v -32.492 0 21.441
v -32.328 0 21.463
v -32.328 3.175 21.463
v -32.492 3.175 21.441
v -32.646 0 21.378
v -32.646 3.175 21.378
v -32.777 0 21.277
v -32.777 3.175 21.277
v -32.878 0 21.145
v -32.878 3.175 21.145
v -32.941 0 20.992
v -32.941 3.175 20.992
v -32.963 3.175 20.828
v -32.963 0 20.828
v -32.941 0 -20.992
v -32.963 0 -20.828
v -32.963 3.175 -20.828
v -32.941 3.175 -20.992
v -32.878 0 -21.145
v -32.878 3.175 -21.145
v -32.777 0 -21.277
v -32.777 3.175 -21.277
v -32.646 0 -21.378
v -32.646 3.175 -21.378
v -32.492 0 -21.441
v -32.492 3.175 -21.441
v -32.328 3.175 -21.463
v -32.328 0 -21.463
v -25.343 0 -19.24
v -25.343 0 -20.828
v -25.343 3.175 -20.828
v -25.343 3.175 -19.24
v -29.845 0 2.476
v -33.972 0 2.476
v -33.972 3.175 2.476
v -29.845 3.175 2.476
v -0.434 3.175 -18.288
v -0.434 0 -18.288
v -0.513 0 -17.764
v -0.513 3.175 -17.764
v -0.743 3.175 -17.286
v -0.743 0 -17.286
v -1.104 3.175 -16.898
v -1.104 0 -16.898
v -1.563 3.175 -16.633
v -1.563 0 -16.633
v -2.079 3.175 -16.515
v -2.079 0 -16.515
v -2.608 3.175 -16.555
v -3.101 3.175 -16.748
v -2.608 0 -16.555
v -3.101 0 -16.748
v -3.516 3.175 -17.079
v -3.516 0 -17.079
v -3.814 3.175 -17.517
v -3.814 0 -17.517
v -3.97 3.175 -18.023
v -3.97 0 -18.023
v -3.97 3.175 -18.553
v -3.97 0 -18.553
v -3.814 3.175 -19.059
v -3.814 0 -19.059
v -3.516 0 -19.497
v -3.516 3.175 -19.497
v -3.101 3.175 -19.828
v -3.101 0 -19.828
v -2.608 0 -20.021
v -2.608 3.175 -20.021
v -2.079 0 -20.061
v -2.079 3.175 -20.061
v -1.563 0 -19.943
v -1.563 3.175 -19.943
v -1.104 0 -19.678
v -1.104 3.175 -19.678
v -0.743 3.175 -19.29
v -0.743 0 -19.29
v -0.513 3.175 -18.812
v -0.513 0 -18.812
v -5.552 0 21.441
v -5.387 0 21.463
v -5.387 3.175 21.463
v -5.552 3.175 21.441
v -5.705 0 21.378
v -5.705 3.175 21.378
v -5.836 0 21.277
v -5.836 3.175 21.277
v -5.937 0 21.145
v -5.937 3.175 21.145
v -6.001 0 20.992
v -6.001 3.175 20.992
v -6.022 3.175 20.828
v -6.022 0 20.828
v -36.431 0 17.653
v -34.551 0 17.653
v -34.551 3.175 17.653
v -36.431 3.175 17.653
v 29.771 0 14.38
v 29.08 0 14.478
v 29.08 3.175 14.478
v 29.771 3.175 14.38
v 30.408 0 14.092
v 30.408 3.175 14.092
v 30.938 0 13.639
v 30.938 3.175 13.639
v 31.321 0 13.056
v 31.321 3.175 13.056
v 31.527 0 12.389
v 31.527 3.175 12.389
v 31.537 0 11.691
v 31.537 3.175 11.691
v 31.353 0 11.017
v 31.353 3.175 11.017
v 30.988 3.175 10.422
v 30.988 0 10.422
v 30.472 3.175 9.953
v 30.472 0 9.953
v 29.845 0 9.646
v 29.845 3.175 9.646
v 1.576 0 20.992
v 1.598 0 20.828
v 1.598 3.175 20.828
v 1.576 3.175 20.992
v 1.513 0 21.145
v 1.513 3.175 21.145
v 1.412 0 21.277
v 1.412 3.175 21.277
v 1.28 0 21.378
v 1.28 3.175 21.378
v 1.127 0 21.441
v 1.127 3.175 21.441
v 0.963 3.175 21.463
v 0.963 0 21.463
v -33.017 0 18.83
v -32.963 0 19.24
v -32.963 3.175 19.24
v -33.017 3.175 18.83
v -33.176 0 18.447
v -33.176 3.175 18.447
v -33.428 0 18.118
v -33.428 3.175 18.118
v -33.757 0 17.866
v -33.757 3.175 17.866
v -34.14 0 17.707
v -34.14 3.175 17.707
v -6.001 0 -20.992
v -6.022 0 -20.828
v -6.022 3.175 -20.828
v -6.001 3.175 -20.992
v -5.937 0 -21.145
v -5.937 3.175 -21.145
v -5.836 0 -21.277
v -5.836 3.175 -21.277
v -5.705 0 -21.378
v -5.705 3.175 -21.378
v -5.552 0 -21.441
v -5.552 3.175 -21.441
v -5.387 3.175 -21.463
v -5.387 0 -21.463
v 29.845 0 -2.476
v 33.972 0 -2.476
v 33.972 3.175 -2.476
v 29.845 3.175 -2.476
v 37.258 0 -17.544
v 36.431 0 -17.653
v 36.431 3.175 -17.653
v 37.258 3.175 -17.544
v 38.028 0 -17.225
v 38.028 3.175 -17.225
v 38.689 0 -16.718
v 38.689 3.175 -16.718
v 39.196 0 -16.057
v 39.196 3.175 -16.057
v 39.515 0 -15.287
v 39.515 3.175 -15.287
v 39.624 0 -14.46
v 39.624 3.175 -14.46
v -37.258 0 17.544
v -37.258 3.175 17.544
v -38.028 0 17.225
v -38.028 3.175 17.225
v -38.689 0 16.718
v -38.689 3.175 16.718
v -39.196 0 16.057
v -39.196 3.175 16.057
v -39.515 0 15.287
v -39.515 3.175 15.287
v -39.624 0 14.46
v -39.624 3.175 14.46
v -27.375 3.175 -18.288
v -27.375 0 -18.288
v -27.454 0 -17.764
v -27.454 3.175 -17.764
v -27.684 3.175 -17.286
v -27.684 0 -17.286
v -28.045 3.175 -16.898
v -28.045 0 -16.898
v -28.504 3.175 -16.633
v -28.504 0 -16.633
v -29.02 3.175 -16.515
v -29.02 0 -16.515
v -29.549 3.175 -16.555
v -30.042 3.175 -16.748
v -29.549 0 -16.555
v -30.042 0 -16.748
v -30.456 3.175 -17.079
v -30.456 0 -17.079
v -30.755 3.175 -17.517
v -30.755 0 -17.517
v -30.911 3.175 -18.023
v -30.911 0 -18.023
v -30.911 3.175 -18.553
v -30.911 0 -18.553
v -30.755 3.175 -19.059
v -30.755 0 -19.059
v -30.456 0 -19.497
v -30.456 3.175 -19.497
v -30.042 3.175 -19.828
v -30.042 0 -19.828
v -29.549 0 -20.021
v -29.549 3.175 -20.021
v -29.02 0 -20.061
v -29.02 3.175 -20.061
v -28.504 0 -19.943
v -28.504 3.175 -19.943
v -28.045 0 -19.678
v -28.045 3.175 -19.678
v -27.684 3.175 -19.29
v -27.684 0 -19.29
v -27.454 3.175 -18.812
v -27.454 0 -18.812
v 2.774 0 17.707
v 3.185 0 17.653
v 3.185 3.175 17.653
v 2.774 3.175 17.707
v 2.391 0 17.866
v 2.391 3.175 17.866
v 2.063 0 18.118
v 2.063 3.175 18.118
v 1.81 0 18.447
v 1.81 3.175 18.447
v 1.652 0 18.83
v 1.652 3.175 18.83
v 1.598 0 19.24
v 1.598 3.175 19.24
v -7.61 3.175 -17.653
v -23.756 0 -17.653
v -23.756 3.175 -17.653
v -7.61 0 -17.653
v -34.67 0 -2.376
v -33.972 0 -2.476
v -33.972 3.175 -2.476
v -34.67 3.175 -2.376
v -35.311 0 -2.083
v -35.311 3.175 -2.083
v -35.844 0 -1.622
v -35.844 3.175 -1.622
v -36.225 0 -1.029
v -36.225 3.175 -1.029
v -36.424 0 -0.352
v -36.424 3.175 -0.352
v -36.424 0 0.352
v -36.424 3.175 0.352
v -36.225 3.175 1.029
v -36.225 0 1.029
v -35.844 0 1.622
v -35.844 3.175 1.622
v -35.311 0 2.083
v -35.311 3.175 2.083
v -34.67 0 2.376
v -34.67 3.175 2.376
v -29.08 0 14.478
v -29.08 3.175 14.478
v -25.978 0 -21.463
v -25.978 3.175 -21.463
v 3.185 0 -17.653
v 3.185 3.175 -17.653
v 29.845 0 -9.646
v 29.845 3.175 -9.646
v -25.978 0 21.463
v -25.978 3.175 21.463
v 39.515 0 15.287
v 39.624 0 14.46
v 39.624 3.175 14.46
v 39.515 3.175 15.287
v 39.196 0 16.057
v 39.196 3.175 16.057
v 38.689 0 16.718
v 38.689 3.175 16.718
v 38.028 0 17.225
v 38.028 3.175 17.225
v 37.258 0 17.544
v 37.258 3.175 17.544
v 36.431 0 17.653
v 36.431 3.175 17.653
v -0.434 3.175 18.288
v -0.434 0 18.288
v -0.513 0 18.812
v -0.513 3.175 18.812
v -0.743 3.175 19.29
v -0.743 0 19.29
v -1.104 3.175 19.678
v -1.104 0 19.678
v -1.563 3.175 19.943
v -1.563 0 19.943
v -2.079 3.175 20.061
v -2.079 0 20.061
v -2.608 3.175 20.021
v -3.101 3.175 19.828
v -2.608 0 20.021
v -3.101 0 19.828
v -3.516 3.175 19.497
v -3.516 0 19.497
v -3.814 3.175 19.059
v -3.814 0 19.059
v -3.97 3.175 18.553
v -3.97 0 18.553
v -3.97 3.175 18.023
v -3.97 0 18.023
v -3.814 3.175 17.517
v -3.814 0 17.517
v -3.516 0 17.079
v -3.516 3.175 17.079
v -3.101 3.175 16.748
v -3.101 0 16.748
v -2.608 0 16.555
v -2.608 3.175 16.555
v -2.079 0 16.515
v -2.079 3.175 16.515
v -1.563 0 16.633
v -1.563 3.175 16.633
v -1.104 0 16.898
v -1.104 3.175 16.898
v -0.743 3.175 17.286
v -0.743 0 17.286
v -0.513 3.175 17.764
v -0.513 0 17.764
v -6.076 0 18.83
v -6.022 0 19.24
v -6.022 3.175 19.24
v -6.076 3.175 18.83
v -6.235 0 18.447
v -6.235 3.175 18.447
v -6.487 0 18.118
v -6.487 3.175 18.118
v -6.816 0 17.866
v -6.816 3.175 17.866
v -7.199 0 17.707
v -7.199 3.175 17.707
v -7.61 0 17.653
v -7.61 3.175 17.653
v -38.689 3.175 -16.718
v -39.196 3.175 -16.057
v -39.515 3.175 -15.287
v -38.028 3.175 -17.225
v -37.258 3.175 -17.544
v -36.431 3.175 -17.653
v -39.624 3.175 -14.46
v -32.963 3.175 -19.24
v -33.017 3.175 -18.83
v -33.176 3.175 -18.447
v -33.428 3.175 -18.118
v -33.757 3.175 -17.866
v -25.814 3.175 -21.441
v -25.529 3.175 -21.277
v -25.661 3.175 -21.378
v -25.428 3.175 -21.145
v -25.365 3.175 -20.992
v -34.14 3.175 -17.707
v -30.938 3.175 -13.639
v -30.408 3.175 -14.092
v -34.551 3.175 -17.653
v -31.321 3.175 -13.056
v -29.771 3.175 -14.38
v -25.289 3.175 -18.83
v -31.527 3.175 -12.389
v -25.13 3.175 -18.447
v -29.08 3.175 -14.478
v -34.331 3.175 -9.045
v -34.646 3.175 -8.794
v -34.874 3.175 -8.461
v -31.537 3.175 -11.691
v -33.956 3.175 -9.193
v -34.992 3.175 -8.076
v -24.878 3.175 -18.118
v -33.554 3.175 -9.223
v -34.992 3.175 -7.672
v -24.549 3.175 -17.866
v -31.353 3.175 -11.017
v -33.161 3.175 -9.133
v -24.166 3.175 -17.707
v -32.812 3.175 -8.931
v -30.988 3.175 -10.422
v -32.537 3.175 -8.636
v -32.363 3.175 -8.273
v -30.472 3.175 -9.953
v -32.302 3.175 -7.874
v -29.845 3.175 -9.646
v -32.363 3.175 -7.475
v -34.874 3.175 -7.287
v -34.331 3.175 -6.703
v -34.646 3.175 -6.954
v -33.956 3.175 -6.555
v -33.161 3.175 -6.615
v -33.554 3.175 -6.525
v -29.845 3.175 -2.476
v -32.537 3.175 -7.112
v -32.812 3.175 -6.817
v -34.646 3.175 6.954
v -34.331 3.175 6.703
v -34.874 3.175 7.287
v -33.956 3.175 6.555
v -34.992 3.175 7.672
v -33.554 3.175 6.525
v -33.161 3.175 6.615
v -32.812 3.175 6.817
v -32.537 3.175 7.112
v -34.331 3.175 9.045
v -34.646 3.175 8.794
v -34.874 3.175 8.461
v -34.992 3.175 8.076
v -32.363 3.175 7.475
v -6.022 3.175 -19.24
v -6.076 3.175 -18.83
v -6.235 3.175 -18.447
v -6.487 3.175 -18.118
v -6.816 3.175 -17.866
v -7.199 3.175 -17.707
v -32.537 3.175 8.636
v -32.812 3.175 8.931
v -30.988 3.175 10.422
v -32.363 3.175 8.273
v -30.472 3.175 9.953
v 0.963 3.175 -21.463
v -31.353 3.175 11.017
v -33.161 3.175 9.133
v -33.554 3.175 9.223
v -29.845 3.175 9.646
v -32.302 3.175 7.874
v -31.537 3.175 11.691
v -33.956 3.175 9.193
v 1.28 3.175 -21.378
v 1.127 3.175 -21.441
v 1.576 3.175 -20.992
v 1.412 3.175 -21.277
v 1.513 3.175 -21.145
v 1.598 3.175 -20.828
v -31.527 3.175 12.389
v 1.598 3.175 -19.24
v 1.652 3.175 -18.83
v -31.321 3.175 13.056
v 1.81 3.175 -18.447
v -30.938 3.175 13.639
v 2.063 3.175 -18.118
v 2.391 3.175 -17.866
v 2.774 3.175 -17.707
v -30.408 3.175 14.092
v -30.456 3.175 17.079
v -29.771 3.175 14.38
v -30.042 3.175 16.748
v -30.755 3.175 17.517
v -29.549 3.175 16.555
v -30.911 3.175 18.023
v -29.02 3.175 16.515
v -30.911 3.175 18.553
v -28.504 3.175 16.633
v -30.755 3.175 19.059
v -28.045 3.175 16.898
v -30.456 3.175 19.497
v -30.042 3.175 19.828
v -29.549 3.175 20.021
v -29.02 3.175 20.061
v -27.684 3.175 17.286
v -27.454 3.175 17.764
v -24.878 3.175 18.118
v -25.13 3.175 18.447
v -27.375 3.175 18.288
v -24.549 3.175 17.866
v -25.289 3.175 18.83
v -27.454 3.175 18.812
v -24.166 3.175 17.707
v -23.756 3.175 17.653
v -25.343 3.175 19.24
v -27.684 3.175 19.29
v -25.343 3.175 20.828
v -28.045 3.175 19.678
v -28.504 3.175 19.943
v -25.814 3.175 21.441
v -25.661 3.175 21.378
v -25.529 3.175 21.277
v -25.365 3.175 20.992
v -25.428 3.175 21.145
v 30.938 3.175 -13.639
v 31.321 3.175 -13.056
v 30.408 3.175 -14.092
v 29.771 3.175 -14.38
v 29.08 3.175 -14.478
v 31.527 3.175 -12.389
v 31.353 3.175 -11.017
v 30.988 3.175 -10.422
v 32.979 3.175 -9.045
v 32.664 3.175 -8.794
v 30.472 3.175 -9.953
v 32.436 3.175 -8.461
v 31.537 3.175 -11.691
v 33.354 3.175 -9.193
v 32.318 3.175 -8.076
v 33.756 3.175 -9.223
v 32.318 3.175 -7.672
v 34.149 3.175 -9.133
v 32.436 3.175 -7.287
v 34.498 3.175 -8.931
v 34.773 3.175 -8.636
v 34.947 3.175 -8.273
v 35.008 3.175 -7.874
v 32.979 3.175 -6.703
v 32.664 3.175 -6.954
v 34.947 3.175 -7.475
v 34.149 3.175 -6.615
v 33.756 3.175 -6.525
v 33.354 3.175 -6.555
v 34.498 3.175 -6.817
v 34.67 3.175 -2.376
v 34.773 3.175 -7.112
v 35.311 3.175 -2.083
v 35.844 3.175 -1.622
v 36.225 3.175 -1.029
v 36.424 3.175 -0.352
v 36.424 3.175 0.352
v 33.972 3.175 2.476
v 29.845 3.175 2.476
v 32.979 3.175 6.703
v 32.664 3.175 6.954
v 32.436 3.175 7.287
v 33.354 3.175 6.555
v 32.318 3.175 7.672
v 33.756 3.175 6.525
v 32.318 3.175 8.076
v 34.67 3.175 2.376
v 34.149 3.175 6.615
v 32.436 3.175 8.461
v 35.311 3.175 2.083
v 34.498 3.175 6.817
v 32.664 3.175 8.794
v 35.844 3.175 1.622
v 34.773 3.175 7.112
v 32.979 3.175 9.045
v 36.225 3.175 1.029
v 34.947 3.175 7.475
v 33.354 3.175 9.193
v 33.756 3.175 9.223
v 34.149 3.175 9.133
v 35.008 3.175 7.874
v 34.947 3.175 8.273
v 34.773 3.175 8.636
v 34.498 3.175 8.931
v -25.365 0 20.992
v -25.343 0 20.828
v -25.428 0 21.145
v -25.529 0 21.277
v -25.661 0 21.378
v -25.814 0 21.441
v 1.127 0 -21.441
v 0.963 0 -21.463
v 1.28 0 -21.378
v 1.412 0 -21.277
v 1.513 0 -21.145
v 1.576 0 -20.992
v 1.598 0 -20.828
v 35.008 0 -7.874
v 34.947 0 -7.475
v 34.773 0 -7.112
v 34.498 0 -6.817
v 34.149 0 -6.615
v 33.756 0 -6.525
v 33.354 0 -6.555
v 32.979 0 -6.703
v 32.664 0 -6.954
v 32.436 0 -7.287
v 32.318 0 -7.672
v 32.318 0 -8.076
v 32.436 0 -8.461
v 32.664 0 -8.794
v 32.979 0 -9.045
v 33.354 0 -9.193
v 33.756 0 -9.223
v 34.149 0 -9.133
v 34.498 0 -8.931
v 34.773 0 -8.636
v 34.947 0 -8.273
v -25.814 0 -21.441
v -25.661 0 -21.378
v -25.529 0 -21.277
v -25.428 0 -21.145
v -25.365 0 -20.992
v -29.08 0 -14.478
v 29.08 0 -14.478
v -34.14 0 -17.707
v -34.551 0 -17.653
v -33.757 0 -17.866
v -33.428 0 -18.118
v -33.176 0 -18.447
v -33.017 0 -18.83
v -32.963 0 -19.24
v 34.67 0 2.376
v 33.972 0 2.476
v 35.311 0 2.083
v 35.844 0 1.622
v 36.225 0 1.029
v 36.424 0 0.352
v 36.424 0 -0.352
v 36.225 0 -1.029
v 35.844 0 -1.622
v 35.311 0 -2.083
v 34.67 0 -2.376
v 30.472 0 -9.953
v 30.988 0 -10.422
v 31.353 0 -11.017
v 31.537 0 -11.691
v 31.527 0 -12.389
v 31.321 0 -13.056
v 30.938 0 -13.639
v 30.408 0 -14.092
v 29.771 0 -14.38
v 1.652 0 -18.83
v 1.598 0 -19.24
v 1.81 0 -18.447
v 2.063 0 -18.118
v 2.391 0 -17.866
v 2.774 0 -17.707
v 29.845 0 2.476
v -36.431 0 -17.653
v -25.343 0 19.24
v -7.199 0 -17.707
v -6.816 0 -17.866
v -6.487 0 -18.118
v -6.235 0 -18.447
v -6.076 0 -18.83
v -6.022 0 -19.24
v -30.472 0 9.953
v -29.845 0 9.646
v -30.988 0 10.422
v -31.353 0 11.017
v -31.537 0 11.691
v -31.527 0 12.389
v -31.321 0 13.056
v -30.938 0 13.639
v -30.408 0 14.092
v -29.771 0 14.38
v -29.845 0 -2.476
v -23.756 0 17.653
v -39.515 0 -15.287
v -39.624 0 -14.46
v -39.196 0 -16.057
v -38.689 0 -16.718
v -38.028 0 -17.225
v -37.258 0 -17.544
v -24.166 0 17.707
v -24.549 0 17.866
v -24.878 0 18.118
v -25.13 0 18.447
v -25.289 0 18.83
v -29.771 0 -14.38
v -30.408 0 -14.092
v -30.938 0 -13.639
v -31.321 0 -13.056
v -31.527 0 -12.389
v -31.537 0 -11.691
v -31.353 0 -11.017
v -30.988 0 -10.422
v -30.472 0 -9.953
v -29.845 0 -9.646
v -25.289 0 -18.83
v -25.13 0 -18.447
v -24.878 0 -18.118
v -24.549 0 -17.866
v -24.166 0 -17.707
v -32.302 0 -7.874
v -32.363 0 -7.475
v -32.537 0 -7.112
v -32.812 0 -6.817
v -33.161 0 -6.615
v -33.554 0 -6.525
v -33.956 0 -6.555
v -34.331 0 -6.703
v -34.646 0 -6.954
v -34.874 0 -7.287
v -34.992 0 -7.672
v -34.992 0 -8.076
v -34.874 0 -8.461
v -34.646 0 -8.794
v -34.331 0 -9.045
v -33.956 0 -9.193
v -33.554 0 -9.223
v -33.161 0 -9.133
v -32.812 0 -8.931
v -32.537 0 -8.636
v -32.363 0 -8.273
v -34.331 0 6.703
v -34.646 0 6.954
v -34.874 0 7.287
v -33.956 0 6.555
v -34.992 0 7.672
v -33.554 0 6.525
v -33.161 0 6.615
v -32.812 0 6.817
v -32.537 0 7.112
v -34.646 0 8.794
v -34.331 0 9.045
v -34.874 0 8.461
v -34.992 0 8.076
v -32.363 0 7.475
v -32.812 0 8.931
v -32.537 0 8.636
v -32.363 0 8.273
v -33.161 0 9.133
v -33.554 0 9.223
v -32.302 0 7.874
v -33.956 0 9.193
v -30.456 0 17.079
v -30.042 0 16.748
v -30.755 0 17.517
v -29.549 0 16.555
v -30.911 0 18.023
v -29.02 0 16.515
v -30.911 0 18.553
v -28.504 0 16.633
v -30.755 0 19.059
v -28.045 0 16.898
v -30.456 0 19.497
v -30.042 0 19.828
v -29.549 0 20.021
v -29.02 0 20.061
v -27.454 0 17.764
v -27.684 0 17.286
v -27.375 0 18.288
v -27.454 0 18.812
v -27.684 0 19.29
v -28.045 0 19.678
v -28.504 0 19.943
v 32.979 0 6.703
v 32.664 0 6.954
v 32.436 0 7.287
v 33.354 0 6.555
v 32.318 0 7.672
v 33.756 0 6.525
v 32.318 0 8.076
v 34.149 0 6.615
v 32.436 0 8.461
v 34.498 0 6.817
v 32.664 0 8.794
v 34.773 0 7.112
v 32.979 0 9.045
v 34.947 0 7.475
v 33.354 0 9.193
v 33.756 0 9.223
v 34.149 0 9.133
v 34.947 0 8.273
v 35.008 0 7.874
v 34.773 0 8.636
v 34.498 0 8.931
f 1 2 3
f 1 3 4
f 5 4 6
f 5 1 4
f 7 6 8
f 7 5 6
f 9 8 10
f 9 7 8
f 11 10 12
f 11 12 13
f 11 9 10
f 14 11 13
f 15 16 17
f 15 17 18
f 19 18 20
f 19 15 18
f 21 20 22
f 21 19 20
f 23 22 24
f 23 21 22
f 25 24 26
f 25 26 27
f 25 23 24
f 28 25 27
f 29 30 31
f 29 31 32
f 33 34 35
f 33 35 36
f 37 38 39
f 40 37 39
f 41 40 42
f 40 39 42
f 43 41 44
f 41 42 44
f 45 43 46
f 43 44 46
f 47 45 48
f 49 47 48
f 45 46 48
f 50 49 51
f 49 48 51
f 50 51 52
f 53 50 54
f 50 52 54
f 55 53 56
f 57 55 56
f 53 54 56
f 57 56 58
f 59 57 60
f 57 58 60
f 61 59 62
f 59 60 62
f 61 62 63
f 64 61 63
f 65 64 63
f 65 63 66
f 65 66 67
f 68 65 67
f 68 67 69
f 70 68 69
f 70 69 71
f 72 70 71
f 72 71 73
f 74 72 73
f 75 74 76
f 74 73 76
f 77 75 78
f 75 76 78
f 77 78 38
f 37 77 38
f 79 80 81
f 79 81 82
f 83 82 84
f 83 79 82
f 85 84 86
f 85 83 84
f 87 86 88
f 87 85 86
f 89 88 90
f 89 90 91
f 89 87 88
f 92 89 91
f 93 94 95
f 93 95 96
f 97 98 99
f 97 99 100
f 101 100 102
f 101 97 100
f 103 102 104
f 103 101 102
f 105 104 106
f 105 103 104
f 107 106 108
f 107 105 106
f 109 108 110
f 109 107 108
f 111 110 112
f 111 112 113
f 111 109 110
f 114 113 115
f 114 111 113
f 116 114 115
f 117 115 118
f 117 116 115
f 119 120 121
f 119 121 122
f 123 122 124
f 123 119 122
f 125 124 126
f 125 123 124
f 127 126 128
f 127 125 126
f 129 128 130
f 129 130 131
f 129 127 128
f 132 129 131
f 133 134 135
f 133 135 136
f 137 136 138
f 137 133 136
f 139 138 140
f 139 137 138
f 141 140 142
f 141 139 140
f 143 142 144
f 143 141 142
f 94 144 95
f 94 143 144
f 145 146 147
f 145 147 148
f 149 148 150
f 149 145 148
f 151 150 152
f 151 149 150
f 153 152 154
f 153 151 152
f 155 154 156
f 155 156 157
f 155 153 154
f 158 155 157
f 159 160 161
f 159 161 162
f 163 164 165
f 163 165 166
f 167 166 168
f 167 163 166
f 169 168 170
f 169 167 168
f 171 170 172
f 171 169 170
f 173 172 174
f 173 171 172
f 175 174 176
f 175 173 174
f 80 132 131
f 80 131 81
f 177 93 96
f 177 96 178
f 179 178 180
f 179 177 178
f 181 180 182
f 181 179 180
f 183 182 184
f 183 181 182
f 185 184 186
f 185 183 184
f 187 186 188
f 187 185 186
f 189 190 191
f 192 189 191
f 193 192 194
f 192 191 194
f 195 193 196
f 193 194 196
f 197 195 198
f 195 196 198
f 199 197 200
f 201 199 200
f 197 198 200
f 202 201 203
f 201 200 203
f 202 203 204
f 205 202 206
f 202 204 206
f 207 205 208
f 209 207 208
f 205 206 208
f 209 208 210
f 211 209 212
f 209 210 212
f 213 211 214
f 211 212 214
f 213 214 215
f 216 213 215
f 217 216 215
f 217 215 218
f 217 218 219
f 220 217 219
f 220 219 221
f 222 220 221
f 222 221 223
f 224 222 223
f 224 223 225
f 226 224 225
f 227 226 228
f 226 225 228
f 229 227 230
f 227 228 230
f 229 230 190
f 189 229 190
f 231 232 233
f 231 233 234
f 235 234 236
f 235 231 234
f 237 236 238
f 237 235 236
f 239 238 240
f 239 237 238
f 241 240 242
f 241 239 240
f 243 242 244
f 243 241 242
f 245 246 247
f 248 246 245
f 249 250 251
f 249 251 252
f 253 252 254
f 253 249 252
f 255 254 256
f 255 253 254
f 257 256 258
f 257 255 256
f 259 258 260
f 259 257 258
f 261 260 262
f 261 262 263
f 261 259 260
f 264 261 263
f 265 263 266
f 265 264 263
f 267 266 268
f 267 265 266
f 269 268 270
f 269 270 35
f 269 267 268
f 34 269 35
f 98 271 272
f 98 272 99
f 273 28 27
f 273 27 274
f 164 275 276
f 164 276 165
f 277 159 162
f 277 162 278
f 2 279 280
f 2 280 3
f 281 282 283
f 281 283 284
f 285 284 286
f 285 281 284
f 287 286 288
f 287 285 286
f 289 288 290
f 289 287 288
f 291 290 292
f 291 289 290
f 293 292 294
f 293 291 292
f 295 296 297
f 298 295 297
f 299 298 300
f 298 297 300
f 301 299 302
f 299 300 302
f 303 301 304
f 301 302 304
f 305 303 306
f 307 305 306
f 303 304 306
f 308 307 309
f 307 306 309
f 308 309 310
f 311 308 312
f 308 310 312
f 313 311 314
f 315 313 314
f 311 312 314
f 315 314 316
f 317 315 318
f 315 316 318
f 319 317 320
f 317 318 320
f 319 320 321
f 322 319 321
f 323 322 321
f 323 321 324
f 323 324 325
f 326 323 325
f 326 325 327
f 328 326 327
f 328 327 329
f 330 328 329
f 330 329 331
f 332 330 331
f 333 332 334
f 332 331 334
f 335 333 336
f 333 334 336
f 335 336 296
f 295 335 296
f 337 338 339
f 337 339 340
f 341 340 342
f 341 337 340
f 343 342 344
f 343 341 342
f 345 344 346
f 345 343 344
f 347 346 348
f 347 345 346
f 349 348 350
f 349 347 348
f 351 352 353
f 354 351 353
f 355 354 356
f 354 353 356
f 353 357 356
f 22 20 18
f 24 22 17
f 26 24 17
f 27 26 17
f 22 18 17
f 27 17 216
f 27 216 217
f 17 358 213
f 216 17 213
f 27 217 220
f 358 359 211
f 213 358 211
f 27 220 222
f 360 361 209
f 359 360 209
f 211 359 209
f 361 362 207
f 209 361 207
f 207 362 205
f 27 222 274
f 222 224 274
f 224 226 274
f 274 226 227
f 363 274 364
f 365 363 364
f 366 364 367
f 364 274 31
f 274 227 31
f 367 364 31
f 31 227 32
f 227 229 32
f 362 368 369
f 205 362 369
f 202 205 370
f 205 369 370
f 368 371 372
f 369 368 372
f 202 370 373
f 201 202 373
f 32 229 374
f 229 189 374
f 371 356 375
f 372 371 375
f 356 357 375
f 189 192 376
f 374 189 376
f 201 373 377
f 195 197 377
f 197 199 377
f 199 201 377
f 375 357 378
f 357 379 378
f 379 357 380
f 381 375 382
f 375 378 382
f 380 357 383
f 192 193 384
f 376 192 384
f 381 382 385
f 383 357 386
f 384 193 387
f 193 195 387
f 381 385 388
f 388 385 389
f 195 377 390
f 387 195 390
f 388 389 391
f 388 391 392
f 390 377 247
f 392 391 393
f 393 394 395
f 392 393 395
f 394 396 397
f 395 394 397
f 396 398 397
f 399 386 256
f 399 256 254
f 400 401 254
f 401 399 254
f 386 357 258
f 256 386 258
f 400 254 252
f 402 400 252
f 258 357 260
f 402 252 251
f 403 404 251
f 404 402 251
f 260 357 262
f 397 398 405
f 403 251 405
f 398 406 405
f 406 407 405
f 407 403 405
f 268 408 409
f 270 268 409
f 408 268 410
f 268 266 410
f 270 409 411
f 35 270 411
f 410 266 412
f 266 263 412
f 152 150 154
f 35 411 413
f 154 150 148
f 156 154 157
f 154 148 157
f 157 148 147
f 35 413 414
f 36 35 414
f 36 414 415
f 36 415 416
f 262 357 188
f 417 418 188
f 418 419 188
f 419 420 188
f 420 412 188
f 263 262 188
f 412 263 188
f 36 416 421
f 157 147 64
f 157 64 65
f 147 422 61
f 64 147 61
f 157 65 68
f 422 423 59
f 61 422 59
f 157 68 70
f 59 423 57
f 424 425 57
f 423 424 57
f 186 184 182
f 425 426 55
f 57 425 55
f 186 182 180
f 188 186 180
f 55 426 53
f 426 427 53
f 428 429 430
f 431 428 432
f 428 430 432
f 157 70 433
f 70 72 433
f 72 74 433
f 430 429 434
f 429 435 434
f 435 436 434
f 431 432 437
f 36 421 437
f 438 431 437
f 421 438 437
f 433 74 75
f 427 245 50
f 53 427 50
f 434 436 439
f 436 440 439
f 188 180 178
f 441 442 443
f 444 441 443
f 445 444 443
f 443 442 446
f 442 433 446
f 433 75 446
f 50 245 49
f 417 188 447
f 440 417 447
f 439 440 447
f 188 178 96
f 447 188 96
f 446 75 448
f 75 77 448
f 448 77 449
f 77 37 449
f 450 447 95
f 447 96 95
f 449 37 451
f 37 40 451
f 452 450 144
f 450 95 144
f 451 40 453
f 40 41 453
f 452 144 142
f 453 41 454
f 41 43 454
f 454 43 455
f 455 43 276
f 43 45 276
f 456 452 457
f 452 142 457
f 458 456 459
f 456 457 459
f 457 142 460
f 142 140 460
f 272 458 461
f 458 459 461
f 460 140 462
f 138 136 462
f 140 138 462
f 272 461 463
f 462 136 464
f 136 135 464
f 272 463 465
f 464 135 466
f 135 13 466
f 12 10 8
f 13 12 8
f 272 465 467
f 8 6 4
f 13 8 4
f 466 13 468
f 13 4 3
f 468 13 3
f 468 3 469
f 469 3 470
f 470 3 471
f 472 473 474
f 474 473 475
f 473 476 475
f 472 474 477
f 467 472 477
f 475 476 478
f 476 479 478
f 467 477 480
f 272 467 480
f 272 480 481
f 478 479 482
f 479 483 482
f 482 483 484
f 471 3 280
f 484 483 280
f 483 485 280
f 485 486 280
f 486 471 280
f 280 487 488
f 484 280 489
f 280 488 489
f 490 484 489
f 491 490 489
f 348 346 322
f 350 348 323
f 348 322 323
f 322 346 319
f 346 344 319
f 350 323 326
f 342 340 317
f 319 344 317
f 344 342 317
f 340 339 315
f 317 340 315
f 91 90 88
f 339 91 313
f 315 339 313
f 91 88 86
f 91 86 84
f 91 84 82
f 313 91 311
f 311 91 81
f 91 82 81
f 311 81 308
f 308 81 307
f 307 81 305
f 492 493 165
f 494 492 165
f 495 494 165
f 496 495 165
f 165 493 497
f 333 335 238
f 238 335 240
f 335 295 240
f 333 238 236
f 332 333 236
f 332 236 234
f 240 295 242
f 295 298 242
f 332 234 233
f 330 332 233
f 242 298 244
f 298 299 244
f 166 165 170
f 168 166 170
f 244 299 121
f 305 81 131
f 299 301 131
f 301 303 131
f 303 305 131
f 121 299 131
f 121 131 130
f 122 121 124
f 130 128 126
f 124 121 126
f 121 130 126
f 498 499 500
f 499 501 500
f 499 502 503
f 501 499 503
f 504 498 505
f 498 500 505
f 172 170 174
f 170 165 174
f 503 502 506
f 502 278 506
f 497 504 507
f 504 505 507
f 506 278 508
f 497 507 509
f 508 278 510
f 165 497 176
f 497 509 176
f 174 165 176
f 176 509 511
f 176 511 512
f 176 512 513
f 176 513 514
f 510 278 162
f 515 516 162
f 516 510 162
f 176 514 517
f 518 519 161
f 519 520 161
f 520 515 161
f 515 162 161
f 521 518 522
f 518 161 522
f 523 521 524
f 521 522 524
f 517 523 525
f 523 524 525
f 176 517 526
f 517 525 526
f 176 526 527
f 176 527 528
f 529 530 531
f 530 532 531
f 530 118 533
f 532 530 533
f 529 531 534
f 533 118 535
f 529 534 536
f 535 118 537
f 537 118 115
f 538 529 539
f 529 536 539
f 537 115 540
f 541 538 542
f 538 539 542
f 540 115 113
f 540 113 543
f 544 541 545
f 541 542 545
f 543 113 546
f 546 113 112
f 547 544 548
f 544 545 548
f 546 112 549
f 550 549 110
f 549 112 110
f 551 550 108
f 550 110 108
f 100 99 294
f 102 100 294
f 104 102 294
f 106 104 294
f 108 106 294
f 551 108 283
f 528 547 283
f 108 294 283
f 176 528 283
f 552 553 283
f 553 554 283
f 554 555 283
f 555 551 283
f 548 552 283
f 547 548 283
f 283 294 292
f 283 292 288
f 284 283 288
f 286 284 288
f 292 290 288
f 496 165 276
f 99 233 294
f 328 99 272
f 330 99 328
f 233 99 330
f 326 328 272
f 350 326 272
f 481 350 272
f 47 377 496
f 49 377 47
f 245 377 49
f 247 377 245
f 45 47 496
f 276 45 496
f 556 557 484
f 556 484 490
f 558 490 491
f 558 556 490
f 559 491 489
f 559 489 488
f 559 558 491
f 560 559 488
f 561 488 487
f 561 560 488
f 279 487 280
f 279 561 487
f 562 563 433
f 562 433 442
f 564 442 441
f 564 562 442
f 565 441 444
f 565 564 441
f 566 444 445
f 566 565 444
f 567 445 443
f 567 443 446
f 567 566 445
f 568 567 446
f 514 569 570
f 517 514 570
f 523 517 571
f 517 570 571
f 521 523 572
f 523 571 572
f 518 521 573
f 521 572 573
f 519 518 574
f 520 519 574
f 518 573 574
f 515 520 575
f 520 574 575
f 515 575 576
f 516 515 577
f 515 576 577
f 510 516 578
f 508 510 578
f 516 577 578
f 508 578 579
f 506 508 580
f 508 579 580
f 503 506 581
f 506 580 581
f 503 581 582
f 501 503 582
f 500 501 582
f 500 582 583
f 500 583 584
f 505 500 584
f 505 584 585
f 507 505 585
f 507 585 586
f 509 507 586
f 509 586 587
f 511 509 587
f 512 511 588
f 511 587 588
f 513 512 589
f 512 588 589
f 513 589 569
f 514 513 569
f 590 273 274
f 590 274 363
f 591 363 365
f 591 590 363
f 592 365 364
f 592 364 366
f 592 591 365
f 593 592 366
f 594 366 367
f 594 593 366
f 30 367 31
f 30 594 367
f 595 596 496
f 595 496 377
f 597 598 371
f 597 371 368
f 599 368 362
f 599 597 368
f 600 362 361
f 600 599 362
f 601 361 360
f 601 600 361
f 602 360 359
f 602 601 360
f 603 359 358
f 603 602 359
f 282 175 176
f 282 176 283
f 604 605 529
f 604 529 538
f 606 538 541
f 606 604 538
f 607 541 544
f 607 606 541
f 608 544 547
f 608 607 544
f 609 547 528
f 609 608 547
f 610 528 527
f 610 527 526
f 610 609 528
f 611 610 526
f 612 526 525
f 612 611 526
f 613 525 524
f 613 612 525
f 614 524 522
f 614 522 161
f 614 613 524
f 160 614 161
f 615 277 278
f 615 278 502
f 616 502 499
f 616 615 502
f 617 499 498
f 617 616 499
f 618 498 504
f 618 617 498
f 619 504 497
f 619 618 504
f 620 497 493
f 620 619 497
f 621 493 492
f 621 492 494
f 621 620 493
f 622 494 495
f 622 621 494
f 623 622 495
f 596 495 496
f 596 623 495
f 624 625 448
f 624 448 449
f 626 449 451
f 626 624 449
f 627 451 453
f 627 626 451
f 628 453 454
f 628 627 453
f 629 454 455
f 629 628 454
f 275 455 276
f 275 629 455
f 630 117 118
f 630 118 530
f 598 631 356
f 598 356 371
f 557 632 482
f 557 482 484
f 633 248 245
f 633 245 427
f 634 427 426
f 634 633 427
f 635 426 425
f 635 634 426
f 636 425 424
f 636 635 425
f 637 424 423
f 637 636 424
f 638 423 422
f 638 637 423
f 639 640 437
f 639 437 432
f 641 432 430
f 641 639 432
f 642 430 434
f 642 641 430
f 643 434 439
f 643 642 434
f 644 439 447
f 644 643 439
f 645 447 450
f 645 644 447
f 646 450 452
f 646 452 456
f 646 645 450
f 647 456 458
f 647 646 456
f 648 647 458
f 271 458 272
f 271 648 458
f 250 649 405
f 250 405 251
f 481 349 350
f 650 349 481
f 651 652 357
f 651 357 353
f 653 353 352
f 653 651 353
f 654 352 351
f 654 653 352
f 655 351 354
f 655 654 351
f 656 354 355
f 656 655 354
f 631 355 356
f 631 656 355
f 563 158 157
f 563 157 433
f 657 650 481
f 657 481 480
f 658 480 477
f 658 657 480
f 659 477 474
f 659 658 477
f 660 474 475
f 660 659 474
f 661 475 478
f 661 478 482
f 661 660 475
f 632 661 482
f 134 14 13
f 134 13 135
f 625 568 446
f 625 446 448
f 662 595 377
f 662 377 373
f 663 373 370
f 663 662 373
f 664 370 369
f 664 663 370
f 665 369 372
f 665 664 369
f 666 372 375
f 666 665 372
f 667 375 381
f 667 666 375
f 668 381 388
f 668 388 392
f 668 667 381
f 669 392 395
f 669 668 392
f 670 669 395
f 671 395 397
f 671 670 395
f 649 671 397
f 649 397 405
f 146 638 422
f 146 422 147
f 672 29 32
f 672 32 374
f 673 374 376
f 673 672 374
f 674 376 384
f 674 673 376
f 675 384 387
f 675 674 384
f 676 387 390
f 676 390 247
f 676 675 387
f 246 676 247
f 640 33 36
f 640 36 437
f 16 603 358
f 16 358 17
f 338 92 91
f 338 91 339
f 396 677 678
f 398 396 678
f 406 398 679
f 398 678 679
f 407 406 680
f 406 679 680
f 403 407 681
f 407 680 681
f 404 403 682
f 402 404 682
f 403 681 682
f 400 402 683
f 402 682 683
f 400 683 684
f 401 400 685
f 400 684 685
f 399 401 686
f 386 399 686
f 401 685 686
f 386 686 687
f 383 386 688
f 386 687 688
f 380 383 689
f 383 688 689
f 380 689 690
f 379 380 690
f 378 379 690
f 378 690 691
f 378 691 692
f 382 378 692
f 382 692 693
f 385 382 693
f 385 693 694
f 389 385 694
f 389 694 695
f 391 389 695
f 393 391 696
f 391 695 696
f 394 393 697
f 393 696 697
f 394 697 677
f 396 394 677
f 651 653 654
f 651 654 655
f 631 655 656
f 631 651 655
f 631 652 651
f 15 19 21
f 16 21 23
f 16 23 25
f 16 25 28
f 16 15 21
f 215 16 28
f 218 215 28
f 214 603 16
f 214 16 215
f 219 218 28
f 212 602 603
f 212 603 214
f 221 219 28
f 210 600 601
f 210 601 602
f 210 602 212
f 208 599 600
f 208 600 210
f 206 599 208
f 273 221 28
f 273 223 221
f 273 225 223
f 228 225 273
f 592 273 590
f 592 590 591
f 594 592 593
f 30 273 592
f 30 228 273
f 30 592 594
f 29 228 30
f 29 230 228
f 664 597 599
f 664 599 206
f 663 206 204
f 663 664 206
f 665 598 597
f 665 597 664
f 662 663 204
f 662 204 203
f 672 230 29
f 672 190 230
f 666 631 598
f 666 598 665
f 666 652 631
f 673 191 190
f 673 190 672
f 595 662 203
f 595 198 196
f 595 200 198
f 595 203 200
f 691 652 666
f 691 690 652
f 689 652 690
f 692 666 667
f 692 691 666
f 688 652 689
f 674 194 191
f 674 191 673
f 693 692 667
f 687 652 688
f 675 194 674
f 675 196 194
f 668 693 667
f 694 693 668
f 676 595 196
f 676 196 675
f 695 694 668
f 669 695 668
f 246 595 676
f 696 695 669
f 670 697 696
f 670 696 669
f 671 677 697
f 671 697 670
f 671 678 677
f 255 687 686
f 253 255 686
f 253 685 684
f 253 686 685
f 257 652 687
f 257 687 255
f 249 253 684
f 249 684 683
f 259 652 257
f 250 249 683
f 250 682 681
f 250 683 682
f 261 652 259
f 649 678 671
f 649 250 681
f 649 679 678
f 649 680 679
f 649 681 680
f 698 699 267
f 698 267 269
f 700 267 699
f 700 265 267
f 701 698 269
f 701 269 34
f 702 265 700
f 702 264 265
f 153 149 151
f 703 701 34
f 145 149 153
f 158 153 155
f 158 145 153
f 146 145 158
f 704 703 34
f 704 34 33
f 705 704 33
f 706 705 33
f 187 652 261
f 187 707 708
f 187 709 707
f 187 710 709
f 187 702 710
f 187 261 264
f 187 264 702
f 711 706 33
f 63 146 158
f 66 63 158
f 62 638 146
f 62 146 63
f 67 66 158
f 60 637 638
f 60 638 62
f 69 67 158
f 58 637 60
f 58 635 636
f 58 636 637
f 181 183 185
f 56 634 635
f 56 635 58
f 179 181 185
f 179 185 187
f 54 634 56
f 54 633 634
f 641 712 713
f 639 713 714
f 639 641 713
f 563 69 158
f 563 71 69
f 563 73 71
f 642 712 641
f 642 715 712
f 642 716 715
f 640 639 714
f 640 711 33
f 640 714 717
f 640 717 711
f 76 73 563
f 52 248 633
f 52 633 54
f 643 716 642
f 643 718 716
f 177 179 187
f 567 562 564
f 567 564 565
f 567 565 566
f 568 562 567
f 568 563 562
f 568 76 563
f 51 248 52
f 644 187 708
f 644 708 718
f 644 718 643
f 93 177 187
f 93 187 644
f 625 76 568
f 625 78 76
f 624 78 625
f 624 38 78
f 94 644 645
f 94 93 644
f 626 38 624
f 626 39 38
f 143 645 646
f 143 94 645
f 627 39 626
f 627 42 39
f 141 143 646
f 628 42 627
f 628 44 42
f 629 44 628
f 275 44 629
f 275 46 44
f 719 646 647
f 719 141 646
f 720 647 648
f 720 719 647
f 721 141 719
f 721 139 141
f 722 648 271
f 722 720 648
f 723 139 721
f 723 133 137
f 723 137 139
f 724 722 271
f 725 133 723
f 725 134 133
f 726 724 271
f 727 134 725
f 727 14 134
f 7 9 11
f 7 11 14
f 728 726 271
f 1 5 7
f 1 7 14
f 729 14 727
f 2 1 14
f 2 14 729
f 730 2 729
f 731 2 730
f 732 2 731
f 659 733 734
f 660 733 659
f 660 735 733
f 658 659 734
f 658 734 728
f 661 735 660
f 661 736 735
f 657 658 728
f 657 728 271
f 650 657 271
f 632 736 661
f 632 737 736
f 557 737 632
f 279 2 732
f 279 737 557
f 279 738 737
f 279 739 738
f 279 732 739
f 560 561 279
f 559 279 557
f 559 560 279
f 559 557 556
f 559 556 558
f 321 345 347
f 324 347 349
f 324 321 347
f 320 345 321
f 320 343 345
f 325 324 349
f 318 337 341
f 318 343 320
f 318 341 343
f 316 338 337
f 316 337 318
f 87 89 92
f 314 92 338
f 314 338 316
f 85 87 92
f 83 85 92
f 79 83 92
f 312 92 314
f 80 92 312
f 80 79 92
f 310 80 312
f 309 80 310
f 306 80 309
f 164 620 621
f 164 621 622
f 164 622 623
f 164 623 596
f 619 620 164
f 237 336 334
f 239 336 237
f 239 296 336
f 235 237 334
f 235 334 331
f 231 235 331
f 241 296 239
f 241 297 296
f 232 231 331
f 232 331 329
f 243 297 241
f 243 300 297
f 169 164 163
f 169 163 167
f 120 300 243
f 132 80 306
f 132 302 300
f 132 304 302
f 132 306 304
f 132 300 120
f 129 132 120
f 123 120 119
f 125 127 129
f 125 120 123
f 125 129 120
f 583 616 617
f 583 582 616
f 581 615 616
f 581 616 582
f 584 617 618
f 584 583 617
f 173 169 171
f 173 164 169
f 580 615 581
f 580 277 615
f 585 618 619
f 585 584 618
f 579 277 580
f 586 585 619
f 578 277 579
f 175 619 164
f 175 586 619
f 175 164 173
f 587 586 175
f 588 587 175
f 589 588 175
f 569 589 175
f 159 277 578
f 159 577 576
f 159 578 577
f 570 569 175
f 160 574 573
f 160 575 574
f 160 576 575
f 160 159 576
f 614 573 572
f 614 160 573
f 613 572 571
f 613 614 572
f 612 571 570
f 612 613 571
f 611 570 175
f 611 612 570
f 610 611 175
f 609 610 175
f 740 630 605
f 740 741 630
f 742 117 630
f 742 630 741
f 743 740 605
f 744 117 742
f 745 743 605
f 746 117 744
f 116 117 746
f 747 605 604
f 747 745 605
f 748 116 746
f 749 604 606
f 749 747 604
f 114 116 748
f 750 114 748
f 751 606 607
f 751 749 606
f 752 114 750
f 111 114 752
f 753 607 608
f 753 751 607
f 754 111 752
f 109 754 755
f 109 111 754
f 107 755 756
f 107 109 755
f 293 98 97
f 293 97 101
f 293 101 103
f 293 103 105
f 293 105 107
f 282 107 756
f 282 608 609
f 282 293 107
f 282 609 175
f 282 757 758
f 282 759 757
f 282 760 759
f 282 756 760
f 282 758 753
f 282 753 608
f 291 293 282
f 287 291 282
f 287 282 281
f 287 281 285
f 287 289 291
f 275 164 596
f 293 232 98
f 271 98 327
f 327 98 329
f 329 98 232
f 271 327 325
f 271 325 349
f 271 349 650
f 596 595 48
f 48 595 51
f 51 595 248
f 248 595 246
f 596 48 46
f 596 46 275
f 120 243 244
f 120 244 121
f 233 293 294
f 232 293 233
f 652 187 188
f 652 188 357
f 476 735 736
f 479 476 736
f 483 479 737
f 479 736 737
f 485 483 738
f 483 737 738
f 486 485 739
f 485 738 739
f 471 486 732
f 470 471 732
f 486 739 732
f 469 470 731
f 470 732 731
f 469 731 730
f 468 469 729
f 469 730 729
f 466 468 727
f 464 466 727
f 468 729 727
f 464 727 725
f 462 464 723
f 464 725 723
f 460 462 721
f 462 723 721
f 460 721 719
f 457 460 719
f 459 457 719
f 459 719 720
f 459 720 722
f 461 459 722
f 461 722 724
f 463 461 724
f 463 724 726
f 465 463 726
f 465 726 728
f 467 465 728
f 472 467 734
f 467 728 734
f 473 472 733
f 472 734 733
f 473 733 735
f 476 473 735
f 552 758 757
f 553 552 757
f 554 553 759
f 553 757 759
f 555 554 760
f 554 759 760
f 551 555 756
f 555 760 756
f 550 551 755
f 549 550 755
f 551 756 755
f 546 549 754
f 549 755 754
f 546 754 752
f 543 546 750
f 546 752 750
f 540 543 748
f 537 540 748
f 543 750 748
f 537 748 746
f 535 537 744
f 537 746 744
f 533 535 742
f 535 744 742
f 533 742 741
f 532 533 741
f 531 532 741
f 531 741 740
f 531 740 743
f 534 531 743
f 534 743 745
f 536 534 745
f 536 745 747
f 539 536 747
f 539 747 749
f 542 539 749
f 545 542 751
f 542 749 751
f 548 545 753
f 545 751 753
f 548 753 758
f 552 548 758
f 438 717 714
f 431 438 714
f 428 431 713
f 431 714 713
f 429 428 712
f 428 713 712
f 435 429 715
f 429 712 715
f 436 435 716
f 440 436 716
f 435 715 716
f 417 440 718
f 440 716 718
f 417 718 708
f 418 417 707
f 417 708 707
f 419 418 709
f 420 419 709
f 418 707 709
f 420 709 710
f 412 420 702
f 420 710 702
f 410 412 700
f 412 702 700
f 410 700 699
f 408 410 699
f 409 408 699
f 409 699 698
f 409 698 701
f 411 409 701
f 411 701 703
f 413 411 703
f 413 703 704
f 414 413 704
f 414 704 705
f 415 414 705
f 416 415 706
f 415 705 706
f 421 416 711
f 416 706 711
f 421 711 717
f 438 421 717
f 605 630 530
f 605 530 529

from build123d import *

# Parameters (mm, degrees)
SKETCH1_R           = 1.35255
SKETCH1_R_2         = 1.778
BOSS_EXTRUDE1_DEPTH = 3.175


with BuildPart() as part:
    # Sketch1 → Boss-Extrude1 (new body)
    with BuildSketch(Plane.XZ):
        with BuildLine():
            Line((-6.02234, -19.2405), (-6.02234, -20.828))
            ThreePointArc((-6.02234, -20.828), (-5.836352806, -21.277012806), (-5.38734, -21.463))
            Line((-5.38734, -21.463), (0.96266, -21.463))
            ThreePointArc((0.96266, -21.463), (1.411672806, -21.277012806), (1.59766, -20.828))
            Line((1.59766, -20.828), (1.59766, -19.2405))
            ThreePointArc((1.59766, -19.2405), (2.062627985, -18.117967985), (3.18516, -17.653))
            Line((3.18516, -17.653), (36.43122, -17.653))
            ThreePointArc((36.43122, -17.653), (38.688856389, -16.717856389), (39.624, -14.46022))
            Line((39.624, -14.46022), (39.624, 14.46022))
            ThreePointArc((39.624, 14.46022), (38.688856389, 16.717856389), (36.43122, 17.653))
            Line((36.43122, 17.653), (3.18516, 17.653))
            ThreePointArc((3.18516, 17.653), (2.062627985, 18.117967985), (1.59766, 19.2405))
            Line((1.59766, 19.2405), (1.59766, 20.828))
            ThreePointArc((1.59766, 20.828), (1.411672806, 21.277012806), (0.96266, 21.463))
            Line((0.96266, 21.463), (-5.38734, 21.463))
            ThreePointArc((-5.38734, 21.463), (-5.836352806, 21.277012806), (-6.02234, 20.828))
            Line((-6.02234, 20.828), (-6.02234, 19.2405))
            ThreePointArc((-6.02234, 19.2405), (-6.487307985, 18.117967985), (-7.60984, 17.653))
            Line((-7.60984, 17.653), (-23.755604, 17.653))
            ThreePointArc((-23.755604, 17.653), (-24.878136015, 18.117967985), (-25.343104, 19.2405))
            Line((-25.343104, 19.2405), (-25.343104, 20.828))
            ThreePointArc((-25.343104, 20.828), (-25.529091194, 21.277012806), (-25.978104, 21.463))
            Line((-25.978104, 21.463), (-32.328104, 21.463))
            ThreePointArc((-32.328104, 21.463), (-32.777116806, 21.277012806), (-32.963104, 20.828))
            Line((-32.963104, 20.828), (-32.963104, 19.2405))
            ThreePointArc((-32.963104, 19.2405), (-33.428071985, 18.117967985), (-34.550604, 17.653))
            Line((-34.550604, 17.653), (-36.43122, 17.653))
            ThreePointArc((-36.43122, 17.653), (-38.688856389, 16.717856389), (-39.624, 14.46022))
            Line((-39.624, 14.46022), (-39.624, -14.46022))
            ThreePointArc((-39.624, -14.46022), (-38.688856389, -16.717856389), (-36.43122, -17.653))
            Line((-36.43122, -17.653), (-34.550604, -17.653))
            ThreePointArc((-34.550604, -17.653), (-33.428071985, -18.117967985), (-32.963104, -19.2405))
            Line((-32.963104, -19.2405), (-32.963104, -20.828))
            ThreePointArc((-32.963104, -20.828), (-32.777116806, -21.277012806), (-32.328104, -21.463))
            Line((-32.328104, -21.463), (-25.978104, -21.463))
            ThreePointArc((-25.978104, -21.463), (-25.529091194, -21.277012806), (-25.343104, -20.828))
            Line((-25.343104, -20.828), (-25.343104, -19.2405))
            ThreePointArc((-25.343104, -19.2405), (-24.878136015, -18.117967985), (-23.755604, -17.653))
            Line((-23.755604, -17.653), (-7.60984, -17.653))
            ThreePointArc((-7.60984, -17.653), (-6.487307985, -18.117967985), (-6.02234, -19.2405))
        make_face()
        with Locations((33.655, -7.874)):
            Circle(SKETCH1_R, mode=Mode.SUBTRACT)
        with Locations((-33.655, 7.874)):
            Circle(SKETCH1_R, mode=Mode.SUBTRACT)
        with Locations((-33.655, -7.874)):
            Circle(SKETCH1_R, mode=Mode.SUBTRACT)
        with Locations((-2.21234, 18.288)):
            Circle(SKETCH1_R_2, mode=Mode.SUBTRACT)
        with Locations((-29.153104, -18.288)):
            Circle(SKETCH1_R_2, mode=Mode.SUBTRACT)
        with Locations((-2.21234, -18.288)):
            Circle(SKETCH1_R_2, mode=Mode.SUBTRACT)
        with Locations((-29.153104, 18.288)):
            Circle(SKETCH1_R_2, mode=Mode.SUBTRACT)
        with Locations((33.655, 7.874)):
            Circle(SKETCH1_R, mode=Mode.SUBTRACT)
        with BuildLine():
            Line((-33.9725, 2.4765), (-29.845, 2.4765))
            Line((-29.845, 2.4765), (-29.845, 9.645968035))
            ThreePointArc((-29.845, 9.645968035), (-31.52653105, 12.388525412), (-29.08046, 14.478))
            Line((-29.08046, 14.478), (29.08046, 14.478))
            ThreePointArc((29.08046, 14.478), (31.52653105, 12.388525412), (29.845, 9.645968035))
            Line((29.845, 9.645968035), (29.845, 2.4765))
            Line((29.845, 2.4765), (33.9725, 2.4765))
            ThreePointArc((33.9725, 2.4765), (36.449, 0), (33.9725, -2.4765))
            Line((33.9725, -2.4765), (29.845, -2.4765))
            Line((29.845, -2.4765), (29.845, -9.645968035))
            ThreePointArc((29.845, -9.645968035), (31.52653105, -12.388525412), (29.08046, -14.478))
            Line((29.08046, -14.478), (-29.08046, -14.478))
            ThreePointArc((-29.08046, -14.478), (-31.52653105, -12.388525412), (-29.845, -9.645968035))
            Line((-29.845, -9.645968035), (-29.845, -2.4765))
            Line((-29.845, -2.4765), (-33.9725, -2.4765))
            ThreePointArc((-33.9725, -2.4765), (-36.449, 0), (-33.9725, 2.4765))
        make_face(mode=Mode.SUBTRACT)
    extrude(amount=-BOSS_EXTRUDE1_DEPTH)


solid = part.part
